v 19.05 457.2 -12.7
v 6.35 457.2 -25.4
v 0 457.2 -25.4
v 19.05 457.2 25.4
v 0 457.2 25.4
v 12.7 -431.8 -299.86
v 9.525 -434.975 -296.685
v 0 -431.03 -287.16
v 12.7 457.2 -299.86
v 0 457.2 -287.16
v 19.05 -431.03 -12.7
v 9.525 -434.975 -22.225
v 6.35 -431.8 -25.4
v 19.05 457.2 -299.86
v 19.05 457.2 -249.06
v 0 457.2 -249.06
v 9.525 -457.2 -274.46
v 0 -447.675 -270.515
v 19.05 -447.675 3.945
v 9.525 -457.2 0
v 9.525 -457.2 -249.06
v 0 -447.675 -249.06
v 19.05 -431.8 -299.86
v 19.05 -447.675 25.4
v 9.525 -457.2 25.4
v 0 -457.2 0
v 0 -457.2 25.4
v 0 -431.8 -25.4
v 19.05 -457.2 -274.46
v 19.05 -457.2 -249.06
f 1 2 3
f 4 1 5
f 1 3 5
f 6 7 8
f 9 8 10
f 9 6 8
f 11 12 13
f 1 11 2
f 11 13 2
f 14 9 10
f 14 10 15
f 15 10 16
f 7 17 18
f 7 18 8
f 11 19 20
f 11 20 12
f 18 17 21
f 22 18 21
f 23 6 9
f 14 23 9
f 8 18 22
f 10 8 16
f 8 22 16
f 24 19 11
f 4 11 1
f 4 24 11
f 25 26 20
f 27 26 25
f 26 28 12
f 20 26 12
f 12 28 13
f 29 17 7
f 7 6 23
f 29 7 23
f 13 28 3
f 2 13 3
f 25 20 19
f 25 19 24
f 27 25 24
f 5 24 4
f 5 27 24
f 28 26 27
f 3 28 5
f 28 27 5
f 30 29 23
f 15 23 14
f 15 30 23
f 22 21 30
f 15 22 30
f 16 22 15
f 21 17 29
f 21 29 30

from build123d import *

# Parameters (mm, degrees)
F0_W      = 914.4
F0_H      = 50.8
F1_DEPTH  = 19.05
F2_SIZE   = 25.4
F3_SIZE   = 12.7
F4_DEPTH  = 19.05
F5_SIZE   = 25.4
F6_SIZE   = 12.7
F7_SIZE   = 9.525
F7_2_SIZE = 9.525


with BuildPart() as f1:
    # F0 (on Right) → F1 (new body)
    with BuildSketch(Plane.YZ):
        Rectangle(F0_W, F0_H)
    extrude(amount=F1_DEPTH)

    # F2
    f2_edges = [f1.edges().sort_by_distance(p)[0] for p in [
        (9.525, -457.2, -25.4),
    ]]
    chamfer(f2_edges, length=F2_SIZE)

    # F3
    f3_edges = [f1.edges().sort_by_distance(p)[0] for p in [
        (19.05, 12.7, -25.4),
    ]]
    chamfer(f3_edges, length=F3_SIZE)

    # F7
    f7_edges = [f1.edges().sort_by_distance(p)[0] for p in [
        (19.05, -457.2, 12.7),
        (19.05, -450.85, -6.35),
    ]]
    chamfer(f7_edges, length=F7_SIZE)


with BuildPart() as f4:
    # F0 (on Right) → F4 (new body)
    with BuildSketch(Plane.YZ):
        with Locations((0, -274.4600176811)):
            Rectangle(F0_W, F0_H)
    extrude(amount=F4_DEPTH)

    # F5
    f5_edges = [f4.edges().sort_by_distance(p)[0] for p in [
        (9.525, -457.2, -299.860018),
    ]]
    chamfer(f5_edges, length=F5_SIZE)

    # F6
    f6_edges = [f4.edges().sort_by_distance(p)[0] for p in [
        (0, 12.7, -299.860018),
    ]]
    chamfer(f6_edges, length=F6_SIZE)

    # F7#2
    f7_2_edges = [f4.edges().sort_by_distance(p)[0] for p in [
        (0, -450.85, -280.810018),
        (0, -457.2, -261.760018),
    ]]
    chamfer(f7_2_edges, length=F7_2_SIZE)


solid = Compound([f1.part, f4.part])
